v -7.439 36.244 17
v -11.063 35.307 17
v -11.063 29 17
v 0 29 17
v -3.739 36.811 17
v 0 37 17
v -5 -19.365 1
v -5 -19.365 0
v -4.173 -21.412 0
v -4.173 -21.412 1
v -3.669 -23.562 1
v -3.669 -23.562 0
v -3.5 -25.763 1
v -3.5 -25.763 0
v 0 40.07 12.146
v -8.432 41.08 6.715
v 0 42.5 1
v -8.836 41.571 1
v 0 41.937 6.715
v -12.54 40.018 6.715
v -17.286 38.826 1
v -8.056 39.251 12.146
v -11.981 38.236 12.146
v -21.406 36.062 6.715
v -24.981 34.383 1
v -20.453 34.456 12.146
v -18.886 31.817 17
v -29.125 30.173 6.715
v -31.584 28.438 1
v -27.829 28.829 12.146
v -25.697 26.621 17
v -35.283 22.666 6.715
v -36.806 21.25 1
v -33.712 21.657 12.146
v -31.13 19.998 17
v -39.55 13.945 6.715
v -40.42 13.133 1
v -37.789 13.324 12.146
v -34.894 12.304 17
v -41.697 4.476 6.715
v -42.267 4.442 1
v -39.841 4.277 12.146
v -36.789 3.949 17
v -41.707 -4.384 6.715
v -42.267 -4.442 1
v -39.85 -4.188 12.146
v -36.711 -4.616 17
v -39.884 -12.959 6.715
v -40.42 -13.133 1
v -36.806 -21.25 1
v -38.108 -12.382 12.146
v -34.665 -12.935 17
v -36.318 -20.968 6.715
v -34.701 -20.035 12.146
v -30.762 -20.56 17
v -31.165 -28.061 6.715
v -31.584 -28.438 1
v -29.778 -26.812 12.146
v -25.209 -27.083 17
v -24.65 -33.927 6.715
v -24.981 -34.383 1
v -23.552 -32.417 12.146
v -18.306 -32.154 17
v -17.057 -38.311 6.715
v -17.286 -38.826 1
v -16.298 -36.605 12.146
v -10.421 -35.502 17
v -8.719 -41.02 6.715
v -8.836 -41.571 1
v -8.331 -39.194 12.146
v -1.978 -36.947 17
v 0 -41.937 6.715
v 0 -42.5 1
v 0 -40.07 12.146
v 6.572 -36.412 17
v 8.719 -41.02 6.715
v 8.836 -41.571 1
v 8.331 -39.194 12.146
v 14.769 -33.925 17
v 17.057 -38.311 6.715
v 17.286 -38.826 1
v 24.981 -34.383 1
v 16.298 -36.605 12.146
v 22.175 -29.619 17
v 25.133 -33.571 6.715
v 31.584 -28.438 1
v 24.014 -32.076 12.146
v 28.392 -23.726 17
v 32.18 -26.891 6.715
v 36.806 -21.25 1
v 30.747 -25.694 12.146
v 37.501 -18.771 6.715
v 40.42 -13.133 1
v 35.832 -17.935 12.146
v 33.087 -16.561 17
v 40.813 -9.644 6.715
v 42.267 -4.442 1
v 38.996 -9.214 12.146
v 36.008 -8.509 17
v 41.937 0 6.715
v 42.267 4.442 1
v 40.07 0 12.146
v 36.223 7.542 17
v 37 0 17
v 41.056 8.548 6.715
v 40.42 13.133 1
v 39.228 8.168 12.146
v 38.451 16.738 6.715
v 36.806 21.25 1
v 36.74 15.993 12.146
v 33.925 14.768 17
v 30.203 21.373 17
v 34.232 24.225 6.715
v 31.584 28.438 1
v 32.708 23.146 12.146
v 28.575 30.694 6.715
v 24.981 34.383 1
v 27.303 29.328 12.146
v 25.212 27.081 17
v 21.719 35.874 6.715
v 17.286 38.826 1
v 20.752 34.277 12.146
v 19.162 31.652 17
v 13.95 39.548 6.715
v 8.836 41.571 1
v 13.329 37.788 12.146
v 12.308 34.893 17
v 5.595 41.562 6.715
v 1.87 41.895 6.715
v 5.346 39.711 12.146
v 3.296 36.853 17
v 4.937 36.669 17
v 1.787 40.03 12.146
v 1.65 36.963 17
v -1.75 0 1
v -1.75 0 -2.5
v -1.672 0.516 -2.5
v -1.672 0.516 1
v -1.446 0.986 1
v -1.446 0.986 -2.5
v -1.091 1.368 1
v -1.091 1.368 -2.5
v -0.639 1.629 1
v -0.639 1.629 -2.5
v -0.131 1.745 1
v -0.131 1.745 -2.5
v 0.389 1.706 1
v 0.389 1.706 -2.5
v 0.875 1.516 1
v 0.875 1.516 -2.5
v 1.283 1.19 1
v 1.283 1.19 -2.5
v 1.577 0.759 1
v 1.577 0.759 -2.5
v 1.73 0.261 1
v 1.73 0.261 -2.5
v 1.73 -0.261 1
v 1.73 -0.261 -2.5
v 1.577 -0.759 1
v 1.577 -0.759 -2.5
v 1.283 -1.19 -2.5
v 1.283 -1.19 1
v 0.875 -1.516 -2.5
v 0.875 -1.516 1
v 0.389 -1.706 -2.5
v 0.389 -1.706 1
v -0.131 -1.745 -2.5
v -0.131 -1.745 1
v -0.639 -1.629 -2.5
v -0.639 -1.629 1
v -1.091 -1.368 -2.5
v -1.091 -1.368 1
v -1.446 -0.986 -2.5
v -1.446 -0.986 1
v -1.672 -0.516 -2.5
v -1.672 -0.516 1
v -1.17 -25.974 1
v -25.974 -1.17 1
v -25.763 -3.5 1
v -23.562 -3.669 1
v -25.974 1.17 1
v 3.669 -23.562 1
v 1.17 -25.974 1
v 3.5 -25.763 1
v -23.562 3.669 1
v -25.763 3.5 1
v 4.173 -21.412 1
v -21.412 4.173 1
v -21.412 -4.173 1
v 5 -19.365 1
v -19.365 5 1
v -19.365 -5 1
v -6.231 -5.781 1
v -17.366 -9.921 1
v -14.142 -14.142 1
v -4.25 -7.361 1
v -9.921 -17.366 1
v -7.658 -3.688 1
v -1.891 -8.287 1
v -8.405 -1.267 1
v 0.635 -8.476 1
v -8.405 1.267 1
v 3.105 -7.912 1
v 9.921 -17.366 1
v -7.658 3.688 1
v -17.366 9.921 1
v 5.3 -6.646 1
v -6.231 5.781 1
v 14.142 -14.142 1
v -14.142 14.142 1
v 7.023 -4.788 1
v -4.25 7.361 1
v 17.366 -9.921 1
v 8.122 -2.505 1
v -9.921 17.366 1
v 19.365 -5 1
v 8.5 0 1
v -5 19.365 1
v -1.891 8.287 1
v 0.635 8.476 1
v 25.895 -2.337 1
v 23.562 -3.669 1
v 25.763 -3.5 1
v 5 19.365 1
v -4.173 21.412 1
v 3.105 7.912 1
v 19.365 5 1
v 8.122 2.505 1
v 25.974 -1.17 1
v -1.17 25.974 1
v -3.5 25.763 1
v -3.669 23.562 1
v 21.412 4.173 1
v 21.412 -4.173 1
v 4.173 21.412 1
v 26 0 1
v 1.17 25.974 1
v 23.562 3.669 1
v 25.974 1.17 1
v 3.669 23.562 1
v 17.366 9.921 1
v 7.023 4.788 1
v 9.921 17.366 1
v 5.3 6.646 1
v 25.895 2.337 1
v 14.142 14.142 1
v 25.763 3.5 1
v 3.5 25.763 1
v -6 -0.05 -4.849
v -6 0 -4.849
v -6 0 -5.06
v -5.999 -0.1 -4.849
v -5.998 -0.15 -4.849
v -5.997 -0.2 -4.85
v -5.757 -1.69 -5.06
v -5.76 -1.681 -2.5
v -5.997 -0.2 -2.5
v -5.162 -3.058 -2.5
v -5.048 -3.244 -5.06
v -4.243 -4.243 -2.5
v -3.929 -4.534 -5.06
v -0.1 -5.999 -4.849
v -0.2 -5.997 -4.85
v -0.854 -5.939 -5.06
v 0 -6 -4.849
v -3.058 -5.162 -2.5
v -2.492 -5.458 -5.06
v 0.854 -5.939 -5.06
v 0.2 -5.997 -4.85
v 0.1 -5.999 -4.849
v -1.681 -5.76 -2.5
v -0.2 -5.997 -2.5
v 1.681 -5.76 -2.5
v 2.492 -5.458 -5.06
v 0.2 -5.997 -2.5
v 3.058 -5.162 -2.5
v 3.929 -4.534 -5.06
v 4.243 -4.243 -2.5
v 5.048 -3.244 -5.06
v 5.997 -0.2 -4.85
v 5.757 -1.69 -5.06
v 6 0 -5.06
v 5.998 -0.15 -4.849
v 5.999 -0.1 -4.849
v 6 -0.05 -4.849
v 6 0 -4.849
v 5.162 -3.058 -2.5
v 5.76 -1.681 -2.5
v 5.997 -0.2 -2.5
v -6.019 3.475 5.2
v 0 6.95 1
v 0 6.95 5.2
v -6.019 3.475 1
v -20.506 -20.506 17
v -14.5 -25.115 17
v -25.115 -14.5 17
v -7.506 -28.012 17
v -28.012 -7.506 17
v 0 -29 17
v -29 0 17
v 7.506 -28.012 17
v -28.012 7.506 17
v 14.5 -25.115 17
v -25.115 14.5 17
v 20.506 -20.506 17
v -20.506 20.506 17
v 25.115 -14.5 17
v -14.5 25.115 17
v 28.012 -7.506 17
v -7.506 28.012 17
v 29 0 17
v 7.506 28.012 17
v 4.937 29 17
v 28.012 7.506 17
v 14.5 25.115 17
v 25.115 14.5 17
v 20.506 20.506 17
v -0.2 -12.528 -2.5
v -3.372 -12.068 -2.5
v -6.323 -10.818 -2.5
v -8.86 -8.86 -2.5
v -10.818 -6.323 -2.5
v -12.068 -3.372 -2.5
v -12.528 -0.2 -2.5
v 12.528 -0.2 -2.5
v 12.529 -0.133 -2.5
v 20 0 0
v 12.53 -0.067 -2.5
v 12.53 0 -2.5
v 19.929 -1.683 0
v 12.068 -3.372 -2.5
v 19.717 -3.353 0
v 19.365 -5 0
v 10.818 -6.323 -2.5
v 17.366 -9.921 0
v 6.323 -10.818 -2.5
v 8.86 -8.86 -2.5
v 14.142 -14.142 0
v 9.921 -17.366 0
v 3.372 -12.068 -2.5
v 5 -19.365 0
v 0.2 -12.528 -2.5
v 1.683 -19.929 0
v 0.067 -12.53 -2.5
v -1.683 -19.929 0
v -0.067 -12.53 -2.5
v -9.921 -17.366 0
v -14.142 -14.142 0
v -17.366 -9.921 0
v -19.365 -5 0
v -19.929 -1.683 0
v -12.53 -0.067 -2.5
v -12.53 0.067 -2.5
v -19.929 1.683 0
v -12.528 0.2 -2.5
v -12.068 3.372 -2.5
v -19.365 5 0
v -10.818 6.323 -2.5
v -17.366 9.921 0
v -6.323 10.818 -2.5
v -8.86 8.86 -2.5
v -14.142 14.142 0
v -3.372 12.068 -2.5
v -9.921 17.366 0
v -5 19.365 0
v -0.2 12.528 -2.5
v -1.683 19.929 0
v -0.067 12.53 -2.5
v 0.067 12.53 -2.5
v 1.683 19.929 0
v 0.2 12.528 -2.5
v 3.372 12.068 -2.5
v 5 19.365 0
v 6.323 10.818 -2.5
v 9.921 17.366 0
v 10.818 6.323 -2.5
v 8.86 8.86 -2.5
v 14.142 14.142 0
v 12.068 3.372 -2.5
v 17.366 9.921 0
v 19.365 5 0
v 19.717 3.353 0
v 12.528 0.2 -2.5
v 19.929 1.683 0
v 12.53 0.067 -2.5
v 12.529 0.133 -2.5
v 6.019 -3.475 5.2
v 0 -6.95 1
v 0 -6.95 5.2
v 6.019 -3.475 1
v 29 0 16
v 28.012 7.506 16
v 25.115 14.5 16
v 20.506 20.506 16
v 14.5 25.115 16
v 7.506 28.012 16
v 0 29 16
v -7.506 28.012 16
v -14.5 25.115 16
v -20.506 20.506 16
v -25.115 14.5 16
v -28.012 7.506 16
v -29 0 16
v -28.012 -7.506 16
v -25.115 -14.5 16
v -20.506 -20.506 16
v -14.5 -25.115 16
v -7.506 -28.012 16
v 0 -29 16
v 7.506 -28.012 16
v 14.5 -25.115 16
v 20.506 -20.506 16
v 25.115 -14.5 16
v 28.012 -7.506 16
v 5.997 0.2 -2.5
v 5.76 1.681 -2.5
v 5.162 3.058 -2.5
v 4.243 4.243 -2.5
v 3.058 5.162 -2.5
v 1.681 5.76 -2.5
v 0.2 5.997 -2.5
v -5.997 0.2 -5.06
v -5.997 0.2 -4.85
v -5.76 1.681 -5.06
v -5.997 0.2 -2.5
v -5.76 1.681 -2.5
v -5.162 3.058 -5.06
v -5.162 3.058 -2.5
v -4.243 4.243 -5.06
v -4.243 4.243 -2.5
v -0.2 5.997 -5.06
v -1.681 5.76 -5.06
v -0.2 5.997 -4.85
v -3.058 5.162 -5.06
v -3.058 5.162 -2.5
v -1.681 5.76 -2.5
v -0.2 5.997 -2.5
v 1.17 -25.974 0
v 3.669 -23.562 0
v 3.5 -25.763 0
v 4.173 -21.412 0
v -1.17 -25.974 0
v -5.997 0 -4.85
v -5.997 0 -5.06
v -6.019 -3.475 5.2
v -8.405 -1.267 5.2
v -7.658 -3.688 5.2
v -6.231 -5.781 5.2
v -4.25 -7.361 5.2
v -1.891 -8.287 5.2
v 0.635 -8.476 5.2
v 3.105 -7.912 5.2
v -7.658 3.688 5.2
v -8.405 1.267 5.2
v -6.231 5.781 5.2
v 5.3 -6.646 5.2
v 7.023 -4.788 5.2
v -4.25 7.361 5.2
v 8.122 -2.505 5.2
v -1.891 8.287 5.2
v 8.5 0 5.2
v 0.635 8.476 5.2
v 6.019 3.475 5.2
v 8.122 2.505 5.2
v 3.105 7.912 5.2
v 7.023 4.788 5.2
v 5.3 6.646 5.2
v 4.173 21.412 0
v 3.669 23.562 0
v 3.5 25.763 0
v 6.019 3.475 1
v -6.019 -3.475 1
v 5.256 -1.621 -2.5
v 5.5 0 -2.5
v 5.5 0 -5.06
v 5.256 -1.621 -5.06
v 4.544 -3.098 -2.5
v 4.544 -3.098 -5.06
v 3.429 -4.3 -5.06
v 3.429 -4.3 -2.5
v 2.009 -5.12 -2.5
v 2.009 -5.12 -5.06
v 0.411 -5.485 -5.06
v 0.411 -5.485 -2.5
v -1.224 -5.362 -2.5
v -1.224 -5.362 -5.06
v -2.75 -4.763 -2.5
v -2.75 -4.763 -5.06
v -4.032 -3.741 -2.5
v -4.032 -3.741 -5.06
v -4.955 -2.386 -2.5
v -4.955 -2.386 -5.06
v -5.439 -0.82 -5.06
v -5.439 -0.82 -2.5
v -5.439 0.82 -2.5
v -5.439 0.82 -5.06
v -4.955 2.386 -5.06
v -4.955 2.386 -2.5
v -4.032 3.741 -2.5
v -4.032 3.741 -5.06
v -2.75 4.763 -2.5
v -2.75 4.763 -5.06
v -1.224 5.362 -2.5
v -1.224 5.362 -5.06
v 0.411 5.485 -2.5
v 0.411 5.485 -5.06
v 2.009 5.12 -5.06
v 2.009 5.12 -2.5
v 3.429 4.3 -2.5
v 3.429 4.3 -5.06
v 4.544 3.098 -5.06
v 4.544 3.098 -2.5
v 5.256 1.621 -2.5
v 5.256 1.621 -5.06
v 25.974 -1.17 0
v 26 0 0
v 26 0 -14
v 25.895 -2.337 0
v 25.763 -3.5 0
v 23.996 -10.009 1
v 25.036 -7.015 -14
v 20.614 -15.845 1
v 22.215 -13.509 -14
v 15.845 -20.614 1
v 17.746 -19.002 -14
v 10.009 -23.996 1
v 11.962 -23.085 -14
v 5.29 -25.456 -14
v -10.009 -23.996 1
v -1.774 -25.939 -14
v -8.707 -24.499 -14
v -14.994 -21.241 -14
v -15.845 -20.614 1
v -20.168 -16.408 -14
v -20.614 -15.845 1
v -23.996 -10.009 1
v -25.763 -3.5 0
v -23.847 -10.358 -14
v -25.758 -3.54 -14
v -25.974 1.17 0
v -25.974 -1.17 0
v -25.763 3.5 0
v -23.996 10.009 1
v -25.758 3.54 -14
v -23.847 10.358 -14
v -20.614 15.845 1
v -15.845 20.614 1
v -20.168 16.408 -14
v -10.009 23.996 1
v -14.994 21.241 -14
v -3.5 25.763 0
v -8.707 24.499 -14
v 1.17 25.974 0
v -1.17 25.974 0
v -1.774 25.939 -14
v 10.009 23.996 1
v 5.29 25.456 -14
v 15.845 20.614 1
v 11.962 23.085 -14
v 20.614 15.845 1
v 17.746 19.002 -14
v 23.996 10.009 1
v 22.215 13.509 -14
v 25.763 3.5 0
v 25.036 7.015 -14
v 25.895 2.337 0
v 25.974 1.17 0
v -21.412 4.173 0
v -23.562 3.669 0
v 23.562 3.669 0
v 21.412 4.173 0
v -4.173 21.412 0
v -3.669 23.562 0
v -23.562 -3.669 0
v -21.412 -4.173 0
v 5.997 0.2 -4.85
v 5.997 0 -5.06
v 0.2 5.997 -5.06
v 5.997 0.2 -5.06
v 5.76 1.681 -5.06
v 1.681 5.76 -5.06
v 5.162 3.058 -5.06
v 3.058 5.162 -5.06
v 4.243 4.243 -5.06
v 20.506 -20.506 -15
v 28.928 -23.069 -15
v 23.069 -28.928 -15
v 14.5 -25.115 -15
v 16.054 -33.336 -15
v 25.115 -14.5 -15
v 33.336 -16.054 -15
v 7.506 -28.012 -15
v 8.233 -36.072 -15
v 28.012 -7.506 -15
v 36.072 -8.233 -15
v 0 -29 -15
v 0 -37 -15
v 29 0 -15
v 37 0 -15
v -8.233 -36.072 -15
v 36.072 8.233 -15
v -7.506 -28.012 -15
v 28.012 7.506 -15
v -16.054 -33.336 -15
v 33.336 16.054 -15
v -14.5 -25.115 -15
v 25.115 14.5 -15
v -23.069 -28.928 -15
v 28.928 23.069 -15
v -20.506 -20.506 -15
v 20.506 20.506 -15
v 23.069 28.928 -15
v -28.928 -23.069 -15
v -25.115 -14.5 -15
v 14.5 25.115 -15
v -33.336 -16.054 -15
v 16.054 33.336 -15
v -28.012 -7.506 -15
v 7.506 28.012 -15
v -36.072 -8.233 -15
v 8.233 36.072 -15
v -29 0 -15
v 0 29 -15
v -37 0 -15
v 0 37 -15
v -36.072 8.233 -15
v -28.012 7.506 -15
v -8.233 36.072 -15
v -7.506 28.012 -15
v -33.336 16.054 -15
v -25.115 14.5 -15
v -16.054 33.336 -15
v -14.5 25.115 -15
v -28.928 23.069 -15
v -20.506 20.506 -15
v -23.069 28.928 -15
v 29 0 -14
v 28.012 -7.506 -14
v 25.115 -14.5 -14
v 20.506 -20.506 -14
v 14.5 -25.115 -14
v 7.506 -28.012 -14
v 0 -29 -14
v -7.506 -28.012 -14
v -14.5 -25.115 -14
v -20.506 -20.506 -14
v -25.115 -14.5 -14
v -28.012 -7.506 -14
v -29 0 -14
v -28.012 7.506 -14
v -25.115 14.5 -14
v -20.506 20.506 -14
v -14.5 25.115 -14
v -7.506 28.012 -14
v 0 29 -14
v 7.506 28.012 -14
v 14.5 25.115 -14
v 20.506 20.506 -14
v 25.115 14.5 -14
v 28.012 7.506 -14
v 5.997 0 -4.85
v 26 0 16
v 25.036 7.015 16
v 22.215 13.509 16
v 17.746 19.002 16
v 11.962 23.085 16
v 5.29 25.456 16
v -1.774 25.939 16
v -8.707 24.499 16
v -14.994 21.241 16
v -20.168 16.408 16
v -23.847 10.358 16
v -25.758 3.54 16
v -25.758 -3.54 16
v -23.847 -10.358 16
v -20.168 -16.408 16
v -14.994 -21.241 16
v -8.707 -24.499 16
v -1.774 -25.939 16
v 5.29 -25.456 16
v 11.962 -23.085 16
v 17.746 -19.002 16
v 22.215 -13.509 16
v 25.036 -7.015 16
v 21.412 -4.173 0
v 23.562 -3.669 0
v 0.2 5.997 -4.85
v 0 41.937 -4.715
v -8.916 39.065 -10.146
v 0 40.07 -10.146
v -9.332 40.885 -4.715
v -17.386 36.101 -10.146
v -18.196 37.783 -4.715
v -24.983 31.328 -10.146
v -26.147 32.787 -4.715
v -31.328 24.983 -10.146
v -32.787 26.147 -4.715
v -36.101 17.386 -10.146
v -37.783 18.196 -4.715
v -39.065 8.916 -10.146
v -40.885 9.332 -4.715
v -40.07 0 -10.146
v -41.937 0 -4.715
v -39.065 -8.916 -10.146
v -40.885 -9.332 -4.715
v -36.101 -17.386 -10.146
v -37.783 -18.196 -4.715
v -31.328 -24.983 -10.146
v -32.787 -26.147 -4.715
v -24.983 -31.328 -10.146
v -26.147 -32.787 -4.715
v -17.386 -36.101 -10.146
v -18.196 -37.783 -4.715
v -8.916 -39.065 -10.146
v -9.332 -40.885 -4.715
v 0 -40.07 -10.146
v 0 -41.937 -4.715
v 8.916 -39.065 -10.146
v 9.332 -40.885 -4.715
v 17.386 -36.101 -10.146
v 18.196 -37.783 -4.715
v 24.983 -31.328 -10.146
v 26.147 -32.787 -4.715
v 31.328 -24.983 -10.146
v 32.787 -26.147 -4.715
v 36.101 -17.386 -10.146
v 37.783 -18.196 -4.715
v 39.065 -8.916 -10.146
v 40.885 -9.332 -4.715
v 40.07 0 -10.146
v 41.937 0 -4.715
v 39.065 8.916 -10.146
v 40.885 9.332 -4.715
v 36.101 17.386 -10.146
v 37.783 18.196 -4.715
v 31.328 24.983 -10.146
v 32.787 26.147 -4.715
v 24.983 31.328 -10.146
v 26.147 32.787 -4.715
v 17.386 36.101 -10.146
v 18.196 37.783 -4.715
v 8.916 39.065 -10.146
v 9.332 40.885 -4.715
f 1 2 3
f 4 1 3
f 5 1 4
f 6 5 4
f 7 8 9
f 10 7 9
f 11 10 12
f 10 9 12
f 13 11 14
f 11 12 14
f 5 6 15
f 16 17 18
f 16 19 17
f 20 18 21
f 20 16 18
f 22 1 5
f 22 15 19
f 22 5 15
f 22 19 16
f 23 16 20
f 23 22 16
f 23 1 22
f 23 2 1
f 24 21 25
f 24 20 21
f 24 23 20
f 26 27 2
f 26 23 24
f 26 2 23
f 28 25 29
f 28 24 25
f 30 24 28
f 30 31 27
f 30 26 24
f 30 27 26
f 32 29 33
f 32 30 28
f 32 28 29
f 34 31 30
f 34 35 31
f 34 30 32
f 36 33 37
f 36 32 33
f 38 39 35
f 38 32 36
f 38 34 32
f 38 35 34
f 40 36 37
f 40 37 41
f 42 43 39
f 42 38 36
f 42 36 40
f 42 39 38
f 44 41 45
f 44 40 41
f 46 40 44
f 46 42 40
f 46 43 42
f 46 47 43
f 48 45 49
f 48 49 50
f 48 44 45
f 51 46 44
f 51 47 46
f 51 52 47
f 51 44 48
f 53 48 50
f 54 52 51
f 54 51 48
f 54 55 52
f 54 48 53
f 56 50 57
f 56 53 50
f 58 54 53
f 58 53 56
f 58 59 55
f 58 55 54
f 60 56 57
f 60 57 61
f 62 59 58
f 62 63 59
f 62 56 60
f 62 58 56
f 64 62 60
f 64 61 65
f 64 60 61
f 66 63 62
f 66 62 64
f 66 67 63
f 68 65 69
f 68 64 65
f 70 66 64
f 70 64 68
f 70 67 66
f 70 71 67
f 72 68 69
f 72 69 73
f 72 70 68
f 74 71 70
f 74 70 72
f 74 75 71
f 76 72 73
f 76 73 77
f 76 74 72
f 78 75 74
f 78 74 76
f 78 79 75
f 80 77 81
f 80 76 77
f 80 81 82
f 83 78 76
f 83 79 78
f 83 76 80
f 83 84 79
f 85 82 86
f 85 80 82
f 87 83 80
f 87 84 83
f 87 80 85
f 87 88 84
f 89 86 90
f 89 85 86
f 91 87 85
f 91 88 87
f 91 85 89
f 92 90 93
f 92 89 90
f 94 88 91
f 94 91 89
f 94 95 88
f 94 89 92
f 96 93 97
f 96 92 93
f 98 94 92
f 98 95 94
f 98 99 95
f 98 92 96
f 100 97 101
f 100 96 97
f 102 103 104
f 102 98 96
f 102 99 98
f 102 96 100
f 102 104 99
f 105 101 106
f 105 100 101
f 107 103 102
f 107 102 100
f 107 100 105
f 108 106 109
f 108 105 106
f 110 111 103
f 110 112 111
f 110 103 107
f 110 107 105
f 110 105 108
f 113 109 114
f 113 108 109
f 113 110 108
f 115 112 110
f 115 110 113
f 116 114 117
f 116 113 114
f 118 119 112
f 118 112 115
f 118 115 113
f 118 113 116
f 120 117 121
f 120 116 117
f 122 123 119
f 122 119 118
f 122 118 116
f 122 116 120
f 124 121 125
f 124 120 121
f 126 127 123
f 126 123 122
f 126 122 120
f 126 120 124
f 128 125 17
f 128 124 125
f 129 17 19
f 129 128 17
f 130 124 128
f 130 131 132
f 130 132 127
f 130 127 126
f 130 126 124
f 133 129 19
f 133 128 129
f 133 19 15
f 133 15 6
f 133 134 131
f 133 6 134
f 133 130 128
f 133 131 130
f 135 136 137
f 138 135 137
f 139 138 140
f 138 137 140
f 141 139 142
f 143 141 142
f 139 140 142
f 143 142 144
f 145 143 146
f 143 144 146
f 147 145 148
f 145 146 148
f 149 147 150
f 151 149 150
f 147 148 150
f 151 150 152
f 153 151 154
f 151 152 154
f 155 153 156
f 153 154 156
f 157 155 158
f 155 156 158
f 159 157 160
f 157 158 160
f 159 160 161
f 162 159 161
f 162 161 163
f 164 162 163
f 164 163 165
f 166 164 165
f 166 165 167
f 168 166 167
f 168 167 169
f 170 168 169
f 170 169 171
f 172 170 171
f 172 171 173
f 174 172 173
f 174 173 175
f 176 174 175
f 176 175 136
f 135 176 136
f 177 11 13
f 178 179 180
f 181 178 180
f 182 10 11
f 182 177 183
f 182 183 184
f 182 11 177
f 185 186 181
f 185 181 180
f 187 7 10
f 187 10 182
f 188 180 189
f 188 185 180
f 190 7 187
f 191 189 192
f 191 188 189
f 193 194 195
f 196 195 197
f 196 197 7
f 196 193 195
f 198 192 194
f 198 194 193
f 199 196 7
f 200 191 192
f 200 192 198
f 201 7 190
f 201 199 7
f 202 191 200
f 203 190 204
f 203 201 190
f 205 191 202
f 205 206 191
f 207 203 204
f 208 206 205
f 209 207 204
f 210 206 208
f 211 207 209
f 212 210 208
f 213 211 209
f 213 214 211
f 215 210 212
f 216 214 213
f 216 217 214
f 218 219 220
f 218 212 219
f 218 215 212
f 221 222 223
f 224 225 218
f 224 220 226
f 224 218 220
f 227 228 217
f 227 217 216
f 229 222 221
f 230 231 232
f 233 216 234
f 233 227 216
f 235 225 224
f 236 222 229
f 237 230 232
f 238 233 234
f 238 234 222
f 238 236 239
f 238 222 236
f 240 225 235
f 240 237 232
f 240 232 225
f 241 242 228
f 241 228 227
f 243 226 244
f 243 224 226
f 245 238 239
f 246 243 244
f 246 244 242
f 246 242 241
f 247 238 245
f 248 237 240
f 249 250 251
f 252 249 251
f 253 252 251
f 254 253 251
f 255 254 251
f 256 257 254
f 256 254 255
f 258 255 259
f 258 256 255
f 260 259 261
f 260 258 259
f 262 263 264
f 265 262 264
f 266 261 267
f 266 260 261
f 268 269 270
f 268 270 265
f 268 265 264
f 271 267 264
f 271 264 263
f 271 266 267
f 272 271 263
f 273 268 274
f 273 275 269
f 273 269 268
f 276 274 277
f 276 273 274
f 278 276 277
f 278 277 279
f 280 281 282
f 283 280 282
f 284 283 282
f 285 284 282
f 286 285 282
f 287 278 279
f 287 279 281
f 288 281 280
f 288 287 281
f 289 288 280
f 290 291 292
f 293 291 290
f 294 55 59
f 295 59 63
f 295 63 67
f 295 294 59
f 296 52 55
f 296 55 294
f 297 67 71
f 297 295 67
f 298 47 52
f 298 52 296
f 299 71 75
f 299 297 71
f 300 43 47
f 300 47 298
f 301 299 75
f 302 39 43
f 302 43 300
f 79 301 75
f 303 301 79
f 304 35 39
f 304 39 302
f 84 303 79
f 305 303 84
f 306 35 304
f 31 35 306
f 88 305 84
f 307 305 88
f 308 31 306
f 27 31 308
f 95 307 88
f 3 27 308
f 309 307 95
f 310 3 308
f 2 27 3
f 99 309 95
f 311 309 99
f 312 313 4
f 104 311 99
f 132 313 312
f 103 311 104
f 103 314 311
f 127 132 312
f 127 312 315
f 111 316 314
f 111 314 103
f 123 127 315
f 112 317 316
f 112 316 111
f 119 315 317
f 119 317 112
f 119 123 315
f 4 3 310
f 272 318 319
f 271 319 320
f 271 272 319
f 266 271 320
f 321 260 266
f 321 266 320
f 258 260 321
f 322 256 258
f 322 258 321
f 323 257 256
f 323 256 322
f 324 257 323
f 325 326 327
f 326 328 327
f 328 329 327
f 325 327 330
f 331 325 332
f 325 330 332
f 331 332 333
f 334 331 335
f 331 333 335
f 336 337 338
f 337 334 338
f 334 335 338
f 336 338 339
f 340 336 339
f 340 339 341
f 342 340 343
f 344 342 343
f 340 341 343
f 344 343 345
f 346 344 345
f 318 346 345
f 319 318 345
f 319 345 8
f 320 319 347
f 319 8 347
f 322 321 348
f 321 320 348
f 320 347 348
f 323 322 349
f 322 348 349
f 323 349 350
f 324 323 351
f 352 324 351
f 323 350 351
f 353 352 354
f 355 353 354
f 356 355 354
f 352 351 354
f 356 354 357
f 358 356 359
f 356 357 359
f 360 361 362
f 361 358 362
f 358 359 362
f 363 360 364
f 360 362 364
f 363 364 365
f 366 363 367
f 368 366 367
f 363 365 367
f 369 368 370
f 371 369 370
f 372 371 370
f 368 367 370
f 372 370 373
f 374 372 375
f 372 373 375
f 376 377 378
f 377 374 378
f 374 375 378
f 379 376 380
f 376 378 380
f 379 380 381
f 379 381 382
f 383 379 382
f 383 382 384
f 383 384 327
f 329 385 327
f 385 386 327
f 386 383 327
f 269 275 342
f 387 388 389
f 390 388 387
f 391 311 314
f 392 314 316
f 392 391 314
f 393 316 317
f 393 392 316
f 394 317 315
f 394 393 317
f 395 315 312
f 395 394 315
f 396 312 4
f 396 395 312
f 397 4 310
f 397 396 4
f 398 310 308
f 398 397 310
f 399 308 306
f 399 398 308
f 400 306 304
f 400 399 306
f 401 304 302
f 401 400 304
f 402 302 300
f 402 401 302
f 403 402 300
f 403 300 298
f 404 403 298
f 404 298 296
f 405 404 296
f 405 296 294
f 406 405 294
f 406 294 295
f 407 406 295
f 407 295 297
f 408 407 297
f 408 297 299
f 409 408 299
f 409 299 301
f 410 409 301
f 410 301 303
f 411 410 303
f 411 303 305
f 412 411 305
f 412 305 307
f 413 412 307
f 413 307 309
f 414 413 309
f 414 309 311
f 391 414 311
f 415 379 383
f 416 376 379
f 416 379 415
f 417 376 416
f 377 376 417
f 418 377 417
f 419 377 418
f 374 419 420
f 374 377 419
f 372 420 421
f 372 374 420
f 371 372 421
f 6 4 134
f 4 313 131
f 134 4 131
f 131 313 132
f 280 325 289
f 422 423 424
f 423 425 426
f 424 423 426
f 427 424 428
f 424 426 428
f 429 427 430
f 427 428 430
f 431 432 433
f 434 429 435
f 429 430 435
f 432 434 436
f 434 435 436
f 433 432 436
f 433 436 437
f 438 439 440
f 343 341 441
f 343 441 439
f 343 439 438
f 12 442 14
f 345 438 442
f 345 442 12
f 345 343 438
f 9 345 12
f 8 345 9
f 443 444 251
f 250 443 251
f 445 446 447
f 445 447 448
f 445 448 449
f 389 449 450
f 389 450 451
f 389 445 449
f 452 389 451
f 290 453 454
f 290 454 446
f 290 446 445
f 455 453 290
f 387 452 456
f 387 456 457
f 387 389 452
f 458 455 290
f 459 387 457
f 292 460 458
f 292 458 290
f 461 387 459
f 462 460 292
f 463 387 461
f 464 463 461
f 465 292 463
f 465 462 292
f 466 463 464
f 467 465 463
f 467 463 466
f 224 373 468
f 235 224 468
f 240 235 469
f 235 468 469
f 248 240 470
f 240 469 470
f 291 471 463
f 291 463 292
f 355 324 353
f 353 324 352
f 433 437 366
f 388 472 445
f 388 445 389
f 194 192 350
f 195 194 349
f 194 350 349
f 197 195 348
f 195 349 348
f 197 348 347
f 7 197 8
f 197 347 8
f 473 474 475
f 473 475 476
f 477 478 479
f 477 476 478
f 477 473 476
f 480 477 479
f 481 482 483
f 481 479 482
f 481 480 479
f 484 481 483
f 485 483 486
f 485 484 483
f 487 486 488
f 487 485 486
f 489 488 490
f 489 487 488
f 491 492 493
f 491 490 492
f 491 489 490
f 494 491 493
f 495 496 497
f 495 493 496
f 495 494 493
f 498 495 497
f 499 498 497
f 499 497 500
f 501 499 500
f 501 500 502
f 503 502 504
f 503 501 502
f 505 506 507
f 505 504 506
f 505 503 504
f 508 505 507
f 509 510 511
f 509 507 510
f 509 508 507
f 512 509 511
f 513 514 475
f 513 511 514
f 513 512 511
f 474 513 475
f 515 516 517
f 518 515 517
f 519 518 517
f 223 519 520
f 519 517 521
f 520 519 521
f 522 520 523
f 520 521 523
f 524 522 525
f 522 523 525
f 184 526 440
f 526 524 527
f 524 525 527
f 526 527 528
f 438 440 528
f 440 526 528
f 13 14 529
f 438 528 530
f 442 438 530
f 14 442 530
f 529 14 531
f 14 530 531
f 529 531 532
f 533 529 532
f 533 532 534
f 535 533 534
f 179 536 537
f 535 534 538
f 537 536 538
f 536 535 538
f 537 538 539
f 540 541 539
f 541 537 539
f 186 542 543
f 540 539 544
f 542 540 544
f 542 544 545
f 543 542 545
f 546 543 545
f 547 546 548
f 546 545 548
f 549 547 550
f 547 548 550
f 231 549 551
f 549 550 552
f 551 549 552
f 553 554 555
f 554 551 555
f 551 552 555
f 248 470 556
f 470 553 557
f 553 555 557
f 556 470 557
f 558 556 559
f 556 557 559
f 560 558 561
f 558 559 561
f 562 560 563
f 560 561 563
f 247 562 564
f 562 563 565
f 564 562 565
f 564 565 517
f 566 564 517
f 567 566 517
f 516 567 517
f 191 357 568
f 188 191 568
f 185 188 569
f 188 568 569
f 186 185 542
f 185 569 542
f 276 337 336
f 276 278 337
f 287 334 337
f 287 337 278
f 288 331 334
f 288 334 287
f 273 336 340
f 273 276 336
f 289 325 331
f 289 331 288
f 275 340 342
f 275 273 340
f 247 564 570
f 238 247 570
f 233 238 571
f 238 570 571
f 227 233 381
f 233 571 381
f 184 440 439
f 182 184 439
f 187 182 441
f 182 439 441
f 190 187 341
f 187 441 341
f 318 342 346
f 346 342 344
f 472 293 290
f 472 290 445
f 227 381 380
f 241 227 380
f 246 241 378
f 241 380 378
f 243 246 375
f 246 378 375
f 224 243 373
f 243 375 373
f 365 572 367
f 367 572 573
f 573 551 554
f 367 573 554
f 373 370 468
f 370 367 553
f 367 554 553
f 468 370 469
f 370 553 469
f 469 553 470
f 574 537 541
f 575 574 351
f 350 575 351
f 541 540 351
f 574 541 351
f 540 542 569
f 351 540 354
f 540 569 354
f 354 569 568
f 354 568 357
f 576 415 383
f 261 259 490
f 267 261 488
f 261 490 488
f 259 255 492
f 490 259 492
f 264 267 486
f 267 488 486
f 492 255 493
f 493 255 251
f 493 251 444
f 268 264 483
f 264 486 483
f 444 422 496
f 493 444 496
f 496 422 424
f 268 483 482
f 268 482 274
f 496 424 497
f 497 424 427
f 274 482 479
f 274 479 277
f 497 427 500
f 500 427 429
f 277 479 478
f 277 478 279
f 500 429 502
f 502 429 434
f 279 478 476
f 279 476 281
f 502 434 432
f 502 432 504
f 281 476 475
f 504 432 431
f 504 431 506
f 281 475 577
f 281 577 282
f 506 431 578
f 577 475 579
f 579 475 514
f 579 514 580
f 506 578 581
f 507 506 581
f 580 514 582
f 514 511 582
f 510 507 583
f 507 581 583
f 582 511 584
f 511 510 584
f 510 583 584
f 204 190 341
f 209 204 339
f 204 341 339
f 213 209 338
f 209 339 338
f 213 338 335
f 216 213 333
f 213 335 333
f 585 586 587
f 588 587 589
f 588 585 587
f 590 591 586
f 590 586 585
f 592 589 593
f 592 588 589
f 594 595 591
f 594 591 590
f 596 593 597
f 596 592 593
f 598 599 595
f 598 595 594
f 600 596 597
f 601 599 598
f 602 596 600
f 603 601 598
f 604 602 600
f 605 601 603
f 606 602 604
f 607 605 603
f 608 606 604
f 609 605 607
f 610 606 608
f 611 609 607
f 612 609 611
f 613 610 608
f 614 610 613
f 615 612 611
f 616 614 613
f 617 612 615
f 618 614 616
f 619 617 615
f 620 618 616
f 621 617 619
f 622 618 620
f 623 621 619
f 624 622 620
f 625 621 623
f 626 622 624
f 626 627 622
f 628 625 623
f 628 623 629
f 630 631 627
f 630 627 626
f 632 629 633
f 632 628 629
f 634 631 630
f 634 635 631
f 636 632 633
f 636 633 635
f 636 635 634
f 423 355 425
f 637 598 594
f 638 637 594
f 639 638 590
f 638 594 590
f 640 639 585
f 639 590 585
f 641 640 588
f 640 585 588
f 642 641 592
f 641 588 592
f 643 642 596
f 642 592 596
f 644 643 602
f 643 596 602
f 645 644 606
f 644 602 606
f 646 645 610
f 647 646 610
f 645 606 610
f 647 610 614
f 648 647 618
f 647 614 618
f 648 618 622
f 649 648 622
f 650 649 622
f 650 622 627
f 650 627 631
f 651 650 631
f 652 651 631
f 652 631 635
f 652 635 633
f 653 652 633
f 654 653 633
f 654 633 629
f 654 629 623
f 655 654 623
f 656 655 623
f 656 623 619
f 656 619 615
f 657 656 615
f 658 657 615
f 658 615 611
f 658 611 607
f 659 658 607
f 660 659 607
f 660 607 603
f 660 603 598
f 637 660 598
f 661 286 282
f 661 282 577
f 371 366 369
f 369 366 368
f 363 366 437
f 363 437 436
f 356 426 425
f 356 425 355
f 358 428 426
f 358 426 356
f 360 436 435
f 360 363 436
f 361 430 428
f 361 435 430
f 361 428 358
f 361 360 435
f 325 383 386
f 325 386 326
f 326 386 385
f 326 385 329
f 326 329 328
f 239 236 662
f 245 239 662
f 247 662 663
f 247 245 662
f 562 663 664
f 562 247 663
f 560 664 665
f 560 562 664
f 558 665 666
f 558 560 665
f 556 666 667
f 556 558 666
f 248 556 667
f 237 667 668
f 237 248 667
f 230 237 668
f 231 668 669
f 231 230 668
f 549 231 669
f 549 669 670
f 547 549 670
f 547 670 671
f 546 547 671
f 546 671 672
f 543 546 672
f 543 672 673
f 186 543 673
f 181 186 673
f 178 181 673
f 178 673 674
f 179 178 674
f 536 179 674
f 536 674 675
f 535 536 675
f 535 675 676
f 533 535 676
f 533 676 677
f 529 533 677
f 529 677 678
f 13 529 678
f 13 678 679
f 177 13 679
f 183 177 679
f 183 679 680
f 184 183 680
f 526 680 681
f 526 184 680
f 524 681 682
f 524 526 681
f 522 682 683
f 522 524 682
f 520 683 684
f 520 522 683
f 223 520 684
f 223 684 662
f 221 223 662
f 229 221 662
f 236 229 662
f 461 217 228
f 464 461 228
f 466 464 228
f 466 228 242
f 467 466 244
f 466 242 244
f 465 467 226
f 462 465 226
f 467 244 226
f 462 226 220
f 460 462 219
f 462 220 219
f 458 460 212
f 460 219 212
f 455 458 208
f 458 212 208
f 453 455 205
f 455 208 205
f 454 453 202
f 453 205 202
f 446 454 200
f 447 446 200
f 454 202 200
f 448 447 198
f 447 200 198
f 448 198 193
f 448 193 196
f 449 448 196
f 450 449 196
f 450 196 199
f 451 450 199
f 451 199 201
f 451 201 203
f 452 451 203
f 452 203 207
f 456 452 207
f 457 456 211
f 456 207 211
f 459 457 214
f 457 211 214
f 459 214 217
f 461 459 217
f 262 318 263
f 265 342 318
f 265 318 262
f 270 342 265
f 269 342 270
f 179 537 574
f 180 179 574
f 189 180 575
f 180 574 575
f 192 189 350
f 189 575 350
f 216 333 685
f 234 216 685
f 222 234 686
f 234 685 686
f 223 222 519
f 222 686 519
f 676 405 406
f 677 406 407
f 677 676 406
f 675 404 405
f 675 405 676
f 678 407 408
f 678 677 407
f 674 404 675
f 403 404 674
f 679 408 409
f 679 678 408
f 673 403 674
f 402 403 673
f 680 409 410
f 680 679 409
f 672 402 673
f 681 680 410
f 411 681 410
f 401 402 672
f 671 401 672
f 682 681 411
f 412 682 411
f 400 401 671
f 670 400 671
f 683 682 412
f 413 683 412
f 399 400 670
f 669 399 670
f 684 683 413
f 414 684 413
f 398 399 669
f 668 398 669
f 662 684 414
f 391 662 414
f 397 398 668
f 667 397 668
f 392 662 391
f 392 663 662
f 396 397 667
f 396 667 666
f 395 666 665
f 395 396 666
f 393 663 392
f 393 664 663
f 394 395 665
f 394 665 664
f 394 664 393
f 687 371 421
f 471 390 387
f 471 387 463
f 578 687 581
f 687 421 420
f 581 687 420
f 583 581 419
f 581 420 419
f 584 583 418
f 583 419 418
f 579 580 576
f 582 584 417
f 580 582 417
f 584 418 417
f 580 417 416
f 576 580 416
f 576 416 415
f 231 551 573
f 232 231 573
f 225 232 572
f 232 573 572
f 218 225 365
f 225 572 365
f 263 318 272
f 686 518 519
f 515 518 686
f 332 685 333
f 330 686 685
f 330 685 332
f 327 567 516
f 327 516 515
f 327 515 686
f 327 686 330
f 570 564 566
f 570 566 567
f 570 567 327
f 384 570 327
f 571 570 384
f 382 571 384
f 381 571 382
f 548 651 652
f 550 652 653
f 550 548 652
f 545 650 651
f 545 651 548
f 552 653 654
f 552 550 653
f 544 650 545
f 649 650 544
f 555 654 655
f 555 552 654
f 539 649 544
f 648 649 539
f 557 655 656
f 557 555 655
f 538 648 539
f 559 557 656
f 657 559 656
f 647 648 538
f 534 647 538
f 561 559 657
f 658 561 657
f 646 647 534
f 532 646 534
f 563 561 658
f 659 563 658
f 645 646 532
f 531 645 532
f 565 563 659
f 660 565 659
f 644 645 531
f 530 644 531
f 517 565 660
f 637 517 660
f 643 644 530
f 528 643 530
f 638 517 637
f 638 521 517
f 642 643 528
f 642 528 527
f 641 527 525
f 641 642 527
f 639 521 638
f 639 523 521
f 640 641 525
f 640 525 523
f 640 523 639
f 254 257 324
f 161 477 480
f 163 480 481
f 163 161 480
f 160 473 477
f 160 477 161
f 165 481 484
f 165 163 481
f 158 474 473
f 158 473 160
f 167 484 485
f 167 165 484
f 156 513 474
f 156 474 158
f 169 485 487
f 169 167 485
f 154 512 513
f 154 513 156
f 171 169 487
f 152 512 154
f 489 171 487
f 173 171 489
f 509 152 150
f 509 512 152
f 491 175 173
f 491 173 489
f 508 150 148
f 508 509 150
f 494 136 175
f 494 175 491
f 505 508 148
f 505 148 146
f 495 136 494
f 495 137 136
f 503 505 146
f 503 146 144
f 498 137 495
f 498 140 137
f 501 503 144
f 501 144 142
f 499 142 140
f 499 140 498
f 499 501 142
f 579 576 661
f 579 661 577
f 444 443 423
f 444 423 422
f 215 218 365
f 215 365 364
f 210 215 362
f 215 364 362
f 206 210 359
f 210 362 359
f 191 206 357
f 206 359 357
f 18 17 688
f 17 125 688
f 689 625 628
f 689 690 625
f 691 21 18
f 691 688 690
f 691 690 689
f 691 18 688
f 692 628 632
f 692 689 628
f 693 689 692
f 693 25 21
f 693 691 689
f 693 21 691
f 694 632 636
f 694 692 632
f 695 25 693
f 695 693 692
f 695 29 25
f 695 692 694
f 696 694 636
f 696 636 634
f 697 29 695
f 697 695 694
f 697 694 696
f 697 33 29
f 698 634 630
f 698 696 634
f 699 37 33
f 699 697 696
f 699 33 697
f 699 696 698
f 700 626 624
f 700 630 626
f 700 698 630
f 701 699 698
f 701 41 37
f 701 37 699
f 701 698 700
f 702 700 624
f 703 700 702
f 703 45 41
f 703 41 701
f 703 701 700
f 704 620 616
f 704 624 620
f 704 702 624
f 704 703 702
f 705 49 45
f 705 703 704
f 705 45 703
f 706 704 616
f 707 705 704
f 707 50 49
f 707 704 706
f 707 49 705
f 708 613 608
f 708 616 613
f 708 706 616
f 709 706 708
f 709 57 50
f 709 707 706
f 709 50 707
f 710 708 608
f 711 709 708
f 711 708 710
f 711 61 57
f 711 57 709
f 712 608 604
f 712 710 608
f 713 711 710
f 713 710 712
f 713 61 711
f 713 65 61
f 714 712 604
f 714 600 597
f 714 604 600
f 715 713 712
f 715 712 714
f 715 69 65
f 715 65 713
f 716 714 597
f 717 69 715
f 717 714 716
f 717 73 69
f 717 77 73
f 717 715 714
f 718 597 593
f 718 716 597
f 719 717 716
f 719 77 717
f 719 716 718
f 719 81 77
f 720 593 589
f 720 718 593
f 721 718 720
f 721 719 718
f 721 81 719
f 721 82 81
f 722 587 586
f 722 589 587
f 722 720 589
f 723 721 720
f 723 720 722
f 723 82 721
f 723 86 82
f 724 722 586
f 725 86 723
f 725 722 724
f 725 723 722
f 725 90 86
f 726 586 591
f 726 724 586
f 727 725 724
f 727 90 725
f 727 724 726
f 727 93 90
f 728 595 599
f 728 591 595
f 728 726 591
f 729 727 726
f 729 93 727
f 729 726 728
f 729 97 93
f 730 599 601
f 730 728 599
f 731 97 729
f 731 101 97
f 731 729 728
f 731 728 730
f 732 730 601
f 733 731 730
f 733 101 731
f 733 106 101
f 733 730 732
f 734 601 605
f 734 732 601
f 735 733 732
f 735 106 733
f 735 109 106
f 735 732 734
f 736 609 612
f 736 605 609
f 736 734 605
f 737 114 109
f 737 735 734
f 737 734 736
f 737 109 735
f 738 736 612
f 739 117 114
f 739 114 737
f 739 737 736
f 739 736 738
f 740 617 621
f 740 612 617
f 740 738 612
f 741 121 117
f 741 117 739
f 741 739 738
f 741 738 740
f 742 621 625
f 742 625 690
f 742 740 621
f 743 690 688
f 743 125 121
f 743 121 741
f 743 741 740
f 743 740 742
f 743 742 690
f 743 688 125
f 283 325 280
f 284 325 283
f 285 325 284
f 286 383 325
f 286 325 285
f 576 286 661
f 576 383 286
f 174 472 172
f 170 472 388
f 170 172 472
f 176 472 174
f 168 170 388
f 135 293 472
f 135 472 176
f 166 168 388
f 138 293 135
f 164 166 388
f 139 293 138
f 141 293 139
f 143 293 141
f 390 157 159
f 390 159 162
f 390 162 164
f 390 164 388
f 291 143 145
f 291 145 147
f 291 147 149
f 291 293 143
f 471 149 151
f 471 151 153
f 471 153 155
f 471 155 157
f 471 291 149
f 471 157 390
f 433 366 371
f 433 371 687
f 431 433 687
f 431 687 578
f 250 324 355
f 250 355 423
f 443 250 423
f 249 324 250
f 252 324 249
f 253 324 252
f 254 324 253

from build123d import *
from build123d.topology import SkipClean

# Parameters (mm, degrees)
SKETCH2_R            = 20
BOSS_EXTRUDE1_DEPTH  = 1
SKETCH3_R            = 8.5
BOSS_EXTRUDE2_DEPTH  = 4.2
BOSS_EXTRUDE4_DEPTH  = 2.5
BOSS_EXTRUDE5_DEPTH  = 3.5
CUT_EXTRUDE1_DEPTH   = 2.5
SKETCH14_R           = 1.75
CUT_EXTRUDE2_DEPTH   = 20.5
BOSS_EXTRUDE7_DEPTH  = 2.56
BOSS_EXTRUDE8_DEPTH  = 2.56
CUT_EXTRUDE4_DEPTH   = 1
CIRPATTERN3_COUNT    = 4
BOSS_EXTRUDE10_DEPTH = 2.56
SKETCH22_R           = 29
SKETCH22_R_2         = 26
BOSS_EXTRUDE11_DEPTH = 15
BOSS_EXTRUDE12_START = 15
SKETCH23_R           = 29
SKETCH23_R_2         = 26
BOSS_EXTRUDE12_DEPTH = 15
SKETCH25_R           = 37
SKETCH25_R_2         = 29
BOSS_EXTRUDE14_DEPTH = 16
BOSS_EXTRUDE15_START = 16
SKETCH26_R           = 37
SKETCH26_R_2         = 29
BOSS_EXTRUDE15_DEPTH = 16
SKETCH27_W           = 4.936524623
SKETCH27_H           = 8
BOSS_EXTRUDE16_DEPTH = 16
SKETCH29_W           = 16
SKETCH29_H           = 8
CUT_EXTRUDE5_DEPTH   = 16


with BuildPart() as part:
    # Sketch2 → Boss-Extrude1 (new body)
    with BuildSketch(Plane.XY):
        Circle(SKETCH2_R)
    extrude(amount=BOSS_EXTRUDE1_DEPTH)

    # Sketch3 → Boss-Extrude2 (add)
    with BuildSketch(Plane.XY.offset(1)):
        Circle(SKETCH3_R)
        Polygon((0, 6.95), (-6.018876556, 3.475), (-6.018876556, -3.475), (0, -6.95), (6.018876556, -3.475), (6.018876556, 3.475), align=None, mode=Mode.SUBTRACT)
    extrude(amount=BOSS_EXTRUDE2_DEPTH)

    # Sketch7 → Boss-Extrude4 (add)
    with BuildSketch(Plane(origin=(0, 0, 0), x_dir=(-1, 0, 0), z_dir=(0, 0, -1))):
        with BuildLine():
            Line((-12.53, 0), (0, 0))
            Line((0, 0), (12.53, 0))
            ThreePointArc((12.53, 0), (0, 12.53), (-12.53, 0))
        make_face()
    extrude(amount=BOSS_EXTRUDE4_DEPTH)

    # Sketch10 → Revolve1 (revolve)
    with BuildSketch(Plane.XZ):
        Polygon((12.53, -2.5), (20, 0), (12.53, 0), (0, 0), (0, -2.5), align=None)
    revolve(axis=Axis((0, 0, 0), (0, 0, -1)))

    # Sketch11 → Boss-Extrude5 (add)
    with BuildSketch(Plane(origin=(0, 0, -2.5), x_dir=(-1, 0, 0), z_dir=(0, 0, -1))):
        with BuildLine():
            ThreePointArc((25.763346056, -3.5), (22.477394983, -3.88001547), (19.364916731, -5))
            ThreePointArc((19.364916731, -5), (20, 0), (19.364916731, 5))
            ThreePointArc((19.364916731, 5), (22.477394983, 3.88001547), (25.763346056, 3.5))
            ThreePointArc((25.763346056, 3.5), (26, 0), (25.763346056, -3.5))
        make_face()
        with BuildLine():
            ThreePointArc((3.5, 25.763346056), (3.88001547, 22.477394983), (5, 19.364916731))
            ThreePointArc((5, 19.364916731), (0, 20), (-5, 19.364916731))
            ThreePointArc((-5, 19.364916731), (-3.88001547, 22.477394983), (-3.5, 25.763346056))
            ThreePointArc((-3.5, 25.763346056), (0, 26), (3.5, 25.763346056))
        make_face()
        with BuildLine():
            ThreePointArc((-3.5, -25.763346056), (-3.88001547, -22.477394983), (-5, -19.364916731))
            ThreePointArc((-5, -19.364916731), (0, -20), (5, -19.364916731))
            ThreePointArc((5, -19.364916731), (3.88001547, -22.477394983), (3.5, -25.763346056))
            ThreePointArc((3.5, -25.763346056), (0, -26), (-3.5, -25.763346056))
        make_face()
        with BuildLine():
            ThreePointArc((-25.763346056, 3.5), (-22.477394983, 3.88001547), (-19.364916731, 5))
            ThreePointArc((-19.364916731, 5), (-20, 0), (-19.364916731, -5))
            ThreePointArc((-19.364916731, -5), (-22.477394983, -3.88001547), (-25.763346056, -3.5))
            ThreePointArc((-25.763346056, -3.5), (-26, 0), (-25.763346056, 3.5))
        make_face()
    extrude(amount=-BOSS_EXTRUDE5_DEPTH)

    # Sketch13 → Cut-Extrude1 (cut)
    with BuildSketch(Plane(origin=(0, 0, -2.5), x_dir=(-1, 0, 0), z_dir=(0, 0, -1))):
        with BuildLine():
            ThreePointArc((-3.5, -25.763346056), (0, -26), (3.5, -25.763346056))
            ThreePointArc((3.5, -25.763346056), (3.88001547, -22.477394983), (5, -19.364916731))
            ThreePointArc((5, -19.364916731), (0, -20), (-5, -19.364916731))
            ThreePointArc((-5, -19.364916731), (-3.88001547, -22.477394983), (-3.5, -25.763346056))
        make_face()
        with BuildLine():
            ThreePointArc((5, 19.364916731), (0, 20), (-5, 19.364916731))
            ThreePointArc((-5, 19.364916731), (-3.88001547, 22.477394983), (-3.5, 25.763346056))
            ThreePointArc((-3.5, 25.763346056), (0, 26), (3.5, 25.763346056))
            ThreePointArc((3.5, 25.763346056), (3.88001547, 22.477394983), (5, 19.364916731))
        make_face()
        with BuildLine():
            ThreePointArc((25.763346056, -3.5), (22.477394983, -3.88001547), (19.364916731, -5))
            ThreePointArc((19.364916731, -5), (20, 0), (19.364916731, 5))
            ThreePointArc((19.364916731, 5), (22.477394983, 3.88001547), (25.763346056, 3.5))
            ThreePointArc((25.763346056, 3.5), (26, 0), (25.763346056, -3.5))
        make_face()
        with BuildLine():
            ThreePointArc((-25.763346056, -3.5), (-22.477394983, -3.88001547), (-19.364916731, -5))
            ThreePointArc((-19.364916731, -5), (-20, 0), (-19.364916731, 5))
            ThreePointArc((-19.364916731, 5), (-22.477394983, 3.88001547), (-25.763346056, 3.5))
            ThreePointArc((-25.763346056, 3.5), (-26, 0), (-25.763346056, -3.5))
        make_face()
    extrude(amount=-CUT_EXTRUDE1_DEPTH, mode=Mode.SUBTRACT)

    # Sketch14 → Cut-Extrude2 (cut)
    with BuildSketch(Plane(origin=(0, 0, -2.5), x_dir=(-1, 0, 0), z_dir=(0, 0, -1))):
        Circle(SKETCH14_R)
    extrude(amount=-CUT_EXTRUDE2_DEPTH, mode=Mode.SUBTRACT)

    # Sketch15 → Boss-Extrude7 (add)
    with BuildSketch(Plane(origin=(0, 0, -2.5), x_dir=(-1, 0, 0), z_dir=(0, 0, -1))):
        with BuildLine():
            ThreePointArc((-5.5, 0), (0, 5.5), (5.5, 0))
            Line((5.5, 0), (6, 0))
            ThreePointArc((6, 0), (0, 6), (-6, 0))
            Line((-6, 0), (-5.5, 0))
        make_face()
    extrude(amount=BOSS_EXTRUDE7_DEPTH)

    # Sketch18 → Boss-Extrude8 (add)
    with BuildSketch(Plane(origin=(0, 0, -2.5), x_dir=(-1, 0, 0), z_dir=(0, 0, -1))):
        with BuildLine():
            Line((12.528403729, 0.2), (5.99666574, 0.2))
            ThreePointArc((5.99666574, 0.2), (6, 0), (5.99666574, -0.2))
            Line((5.99666574, -0.2), (12.528403729, -0.2))
            ThreePointArc((12.528403729, -0.2), (12.53, 0), (12.528403729, 0.2))
        make_face()
    boss_extrude8 = extrude(amount=BOSS_EXTRUDE8_DEPTH)

    # Sketch19 → Cut-Extrude4 (cut)
    with BuildSketch(Plane.XZ.offset(0.2)):
        Polygon((-12.528403729, -5.06), (-13.38680772, -5.06), (-13.38680772, -2.5), (-12.528403729, -2.5), (-5.99666574, -4.849997635), (-5.99666574, -5.06), align=None)
    cut_extrude4 = extrude(amount=-CUT_EXTRUDE4_DEPTH, mode=Mode.SUBTRACT)

    # CirPattern3: Boss-Extrude8, Cut-Extrude4 ×4 about axis
    cirpattern3_axis = Axis((0, 0, 0), (0, 0, 1))
    add([boss_extrude8.rotate(cirpattern3_axis, i * 360 / CIRPATTERN3_COUNT) for i in range(1, CIRPATTERN3_COUNT)])
    add([cut_extrude4.rotate(cirpattern3_axis, i * 360 / CIRPATTERN3_COUNT) for i in range(1, CIRPATTERN3_COUNT)], mode=Mode.SUBTRACT)

    # Sketch20 → Boss-Extrude10 (add)
    with SkipClean():  # the faces are left unmerged after this step: merging them gives an invalid solid
        with BuildSketch(Plane(origin=(0, 0, -2.5), x_dir=(-1, 0, 0), z_dir=(0, 0, -1))):
            with BuildLine():
                Line((-6, 0), (-5.5, 0))
                ThreePointArc((-5.5, 0), (0, -5.5), (5.5, 0))
                Line((5.5, 0), (6, 0))
                ThreePointArc((6, 0), (0, -6), (-6, 0))
            make_face()
        extrude(amount=BOSS_EXTRUDE10_DEPTH)



with BuildPart() as body_2:
    # Sketch22 → Boss-Extrude11 (new body)
    with BuildSketch(Plane.XY.offset(1)):
        Circle(SKETCH22_R)
        Circle(SKETCH22_R_2, mode=Mode.SUBTRACT)
    extrude(amount=BOSS_EXTRUDE11_DEPTH)


with BuildPart() as part_1:
    with SkipClean():  # the faces are left unmerged after this step: merging them gives an invalid solid
        add(part.part)

        add(body_2.part)  # Boss-Extrude12 merges body 2
        # Sketch23 → Boss-Extrude12 (add)
        with BuildSketch(Plane(origin=(0, 0, 1), x_dir=(-1, 0, 0), z_dir=(0, 0, -1)).offset(BOSS_EXTRUDE12_START)):
            with Locations(Location((0, 0, 0), (0, 0, 180))):
                Circle(SKETCH23_R)
            with Locations(Location((0, 0, 0), (0, 0, 180))):
                Circle(SKETCH23_R_2, mode=Mode.SUBTRACT)
        extrude(amount=-BOSS_EXTRUDE12_DEPTH)

    # Sketch25 → Boss-Extrude14 (add)
    with SkipClean():  # the faces are left unmerged after this step: merging them gives an invalid solid
        with BuildSketch(Plane.XY.offset(1)):
            Circle(SKETCH25_R)
            Circle(SKETCH25_R_2, mode=Mode.SUBTRACT)
        extrude(amount=BOSS_EXTRUDE14_DEPTH)

    # Sketch26 → Boss-Extrude15 (add)
    with SkipClean():  # the faces are left unmerged after this step: merging them gives an invalid solid
        with BuildSketch(Plane(origin=(0, 0, 1), x_dir=(-1, 0, 0), z_dir=(0, 0, -1)).offset(BOSS_EXTRUDE15_START)):
            Circle(SKETCH26_R)
            with Locations(Location((0, 0, 0), (0, 0, 180))):
                Circle(SKETCH26_R_2, mode=Mode.SUBTRACT)
        extrude(amount=-BOSS_EXTRUDE15_DEPTH)

    # Sketch27 → Boss-Extrude16 (add)
    with SkipClean():  # the faces are left unmerged after this step: merging them gives an invalid solid
        with BuildSketch(Plane.XY.offset(17)):
            with Locations((2.468262312, 33)):
                Rectangle(SKETCH27_W, SKETCH27_H)
        extrude(amount=BOSS_EXTRUDE16_DEPTH)

    # Sketch28 → Revolve2 (revolve)
    with SkipClean():  # the faces are left unmerged after this step: merging them gives an invalid solid
        with BuildSketch(Plane.ZY):
            with BuildLine():
                ThreePointArc((1, 42.5), (9.485130196, 41.161287844), (17, 37))
                Line((17, 37), (-15, 37))
                ThreePointArc((-15, 37), (-7.485130196, 41.161287844), (1, 42.5))
            make_face()
        revolve(axis=Axis((0, 0, -15), (0, 0, 1)))

    # Sketch29 → Cut-Extrude5 (cut)
    with SkipClean():  # the faces are left unmerged after this step: merging them gives an invalid solid
        with BuildSketch(Plane(origin=(4.936524623, 0, 0), x_dir=(0, 0, -1), z_dir=(1, 0, 0))):
            with Locations((-25, 33)):
                Rectangle(SKETCH29_W, SKETCH29_H)
        extrude(amount=-CUT_EXTRUDE5_DEPTH, mode=Mode.SUBTRACT)


solid = part_1.part
